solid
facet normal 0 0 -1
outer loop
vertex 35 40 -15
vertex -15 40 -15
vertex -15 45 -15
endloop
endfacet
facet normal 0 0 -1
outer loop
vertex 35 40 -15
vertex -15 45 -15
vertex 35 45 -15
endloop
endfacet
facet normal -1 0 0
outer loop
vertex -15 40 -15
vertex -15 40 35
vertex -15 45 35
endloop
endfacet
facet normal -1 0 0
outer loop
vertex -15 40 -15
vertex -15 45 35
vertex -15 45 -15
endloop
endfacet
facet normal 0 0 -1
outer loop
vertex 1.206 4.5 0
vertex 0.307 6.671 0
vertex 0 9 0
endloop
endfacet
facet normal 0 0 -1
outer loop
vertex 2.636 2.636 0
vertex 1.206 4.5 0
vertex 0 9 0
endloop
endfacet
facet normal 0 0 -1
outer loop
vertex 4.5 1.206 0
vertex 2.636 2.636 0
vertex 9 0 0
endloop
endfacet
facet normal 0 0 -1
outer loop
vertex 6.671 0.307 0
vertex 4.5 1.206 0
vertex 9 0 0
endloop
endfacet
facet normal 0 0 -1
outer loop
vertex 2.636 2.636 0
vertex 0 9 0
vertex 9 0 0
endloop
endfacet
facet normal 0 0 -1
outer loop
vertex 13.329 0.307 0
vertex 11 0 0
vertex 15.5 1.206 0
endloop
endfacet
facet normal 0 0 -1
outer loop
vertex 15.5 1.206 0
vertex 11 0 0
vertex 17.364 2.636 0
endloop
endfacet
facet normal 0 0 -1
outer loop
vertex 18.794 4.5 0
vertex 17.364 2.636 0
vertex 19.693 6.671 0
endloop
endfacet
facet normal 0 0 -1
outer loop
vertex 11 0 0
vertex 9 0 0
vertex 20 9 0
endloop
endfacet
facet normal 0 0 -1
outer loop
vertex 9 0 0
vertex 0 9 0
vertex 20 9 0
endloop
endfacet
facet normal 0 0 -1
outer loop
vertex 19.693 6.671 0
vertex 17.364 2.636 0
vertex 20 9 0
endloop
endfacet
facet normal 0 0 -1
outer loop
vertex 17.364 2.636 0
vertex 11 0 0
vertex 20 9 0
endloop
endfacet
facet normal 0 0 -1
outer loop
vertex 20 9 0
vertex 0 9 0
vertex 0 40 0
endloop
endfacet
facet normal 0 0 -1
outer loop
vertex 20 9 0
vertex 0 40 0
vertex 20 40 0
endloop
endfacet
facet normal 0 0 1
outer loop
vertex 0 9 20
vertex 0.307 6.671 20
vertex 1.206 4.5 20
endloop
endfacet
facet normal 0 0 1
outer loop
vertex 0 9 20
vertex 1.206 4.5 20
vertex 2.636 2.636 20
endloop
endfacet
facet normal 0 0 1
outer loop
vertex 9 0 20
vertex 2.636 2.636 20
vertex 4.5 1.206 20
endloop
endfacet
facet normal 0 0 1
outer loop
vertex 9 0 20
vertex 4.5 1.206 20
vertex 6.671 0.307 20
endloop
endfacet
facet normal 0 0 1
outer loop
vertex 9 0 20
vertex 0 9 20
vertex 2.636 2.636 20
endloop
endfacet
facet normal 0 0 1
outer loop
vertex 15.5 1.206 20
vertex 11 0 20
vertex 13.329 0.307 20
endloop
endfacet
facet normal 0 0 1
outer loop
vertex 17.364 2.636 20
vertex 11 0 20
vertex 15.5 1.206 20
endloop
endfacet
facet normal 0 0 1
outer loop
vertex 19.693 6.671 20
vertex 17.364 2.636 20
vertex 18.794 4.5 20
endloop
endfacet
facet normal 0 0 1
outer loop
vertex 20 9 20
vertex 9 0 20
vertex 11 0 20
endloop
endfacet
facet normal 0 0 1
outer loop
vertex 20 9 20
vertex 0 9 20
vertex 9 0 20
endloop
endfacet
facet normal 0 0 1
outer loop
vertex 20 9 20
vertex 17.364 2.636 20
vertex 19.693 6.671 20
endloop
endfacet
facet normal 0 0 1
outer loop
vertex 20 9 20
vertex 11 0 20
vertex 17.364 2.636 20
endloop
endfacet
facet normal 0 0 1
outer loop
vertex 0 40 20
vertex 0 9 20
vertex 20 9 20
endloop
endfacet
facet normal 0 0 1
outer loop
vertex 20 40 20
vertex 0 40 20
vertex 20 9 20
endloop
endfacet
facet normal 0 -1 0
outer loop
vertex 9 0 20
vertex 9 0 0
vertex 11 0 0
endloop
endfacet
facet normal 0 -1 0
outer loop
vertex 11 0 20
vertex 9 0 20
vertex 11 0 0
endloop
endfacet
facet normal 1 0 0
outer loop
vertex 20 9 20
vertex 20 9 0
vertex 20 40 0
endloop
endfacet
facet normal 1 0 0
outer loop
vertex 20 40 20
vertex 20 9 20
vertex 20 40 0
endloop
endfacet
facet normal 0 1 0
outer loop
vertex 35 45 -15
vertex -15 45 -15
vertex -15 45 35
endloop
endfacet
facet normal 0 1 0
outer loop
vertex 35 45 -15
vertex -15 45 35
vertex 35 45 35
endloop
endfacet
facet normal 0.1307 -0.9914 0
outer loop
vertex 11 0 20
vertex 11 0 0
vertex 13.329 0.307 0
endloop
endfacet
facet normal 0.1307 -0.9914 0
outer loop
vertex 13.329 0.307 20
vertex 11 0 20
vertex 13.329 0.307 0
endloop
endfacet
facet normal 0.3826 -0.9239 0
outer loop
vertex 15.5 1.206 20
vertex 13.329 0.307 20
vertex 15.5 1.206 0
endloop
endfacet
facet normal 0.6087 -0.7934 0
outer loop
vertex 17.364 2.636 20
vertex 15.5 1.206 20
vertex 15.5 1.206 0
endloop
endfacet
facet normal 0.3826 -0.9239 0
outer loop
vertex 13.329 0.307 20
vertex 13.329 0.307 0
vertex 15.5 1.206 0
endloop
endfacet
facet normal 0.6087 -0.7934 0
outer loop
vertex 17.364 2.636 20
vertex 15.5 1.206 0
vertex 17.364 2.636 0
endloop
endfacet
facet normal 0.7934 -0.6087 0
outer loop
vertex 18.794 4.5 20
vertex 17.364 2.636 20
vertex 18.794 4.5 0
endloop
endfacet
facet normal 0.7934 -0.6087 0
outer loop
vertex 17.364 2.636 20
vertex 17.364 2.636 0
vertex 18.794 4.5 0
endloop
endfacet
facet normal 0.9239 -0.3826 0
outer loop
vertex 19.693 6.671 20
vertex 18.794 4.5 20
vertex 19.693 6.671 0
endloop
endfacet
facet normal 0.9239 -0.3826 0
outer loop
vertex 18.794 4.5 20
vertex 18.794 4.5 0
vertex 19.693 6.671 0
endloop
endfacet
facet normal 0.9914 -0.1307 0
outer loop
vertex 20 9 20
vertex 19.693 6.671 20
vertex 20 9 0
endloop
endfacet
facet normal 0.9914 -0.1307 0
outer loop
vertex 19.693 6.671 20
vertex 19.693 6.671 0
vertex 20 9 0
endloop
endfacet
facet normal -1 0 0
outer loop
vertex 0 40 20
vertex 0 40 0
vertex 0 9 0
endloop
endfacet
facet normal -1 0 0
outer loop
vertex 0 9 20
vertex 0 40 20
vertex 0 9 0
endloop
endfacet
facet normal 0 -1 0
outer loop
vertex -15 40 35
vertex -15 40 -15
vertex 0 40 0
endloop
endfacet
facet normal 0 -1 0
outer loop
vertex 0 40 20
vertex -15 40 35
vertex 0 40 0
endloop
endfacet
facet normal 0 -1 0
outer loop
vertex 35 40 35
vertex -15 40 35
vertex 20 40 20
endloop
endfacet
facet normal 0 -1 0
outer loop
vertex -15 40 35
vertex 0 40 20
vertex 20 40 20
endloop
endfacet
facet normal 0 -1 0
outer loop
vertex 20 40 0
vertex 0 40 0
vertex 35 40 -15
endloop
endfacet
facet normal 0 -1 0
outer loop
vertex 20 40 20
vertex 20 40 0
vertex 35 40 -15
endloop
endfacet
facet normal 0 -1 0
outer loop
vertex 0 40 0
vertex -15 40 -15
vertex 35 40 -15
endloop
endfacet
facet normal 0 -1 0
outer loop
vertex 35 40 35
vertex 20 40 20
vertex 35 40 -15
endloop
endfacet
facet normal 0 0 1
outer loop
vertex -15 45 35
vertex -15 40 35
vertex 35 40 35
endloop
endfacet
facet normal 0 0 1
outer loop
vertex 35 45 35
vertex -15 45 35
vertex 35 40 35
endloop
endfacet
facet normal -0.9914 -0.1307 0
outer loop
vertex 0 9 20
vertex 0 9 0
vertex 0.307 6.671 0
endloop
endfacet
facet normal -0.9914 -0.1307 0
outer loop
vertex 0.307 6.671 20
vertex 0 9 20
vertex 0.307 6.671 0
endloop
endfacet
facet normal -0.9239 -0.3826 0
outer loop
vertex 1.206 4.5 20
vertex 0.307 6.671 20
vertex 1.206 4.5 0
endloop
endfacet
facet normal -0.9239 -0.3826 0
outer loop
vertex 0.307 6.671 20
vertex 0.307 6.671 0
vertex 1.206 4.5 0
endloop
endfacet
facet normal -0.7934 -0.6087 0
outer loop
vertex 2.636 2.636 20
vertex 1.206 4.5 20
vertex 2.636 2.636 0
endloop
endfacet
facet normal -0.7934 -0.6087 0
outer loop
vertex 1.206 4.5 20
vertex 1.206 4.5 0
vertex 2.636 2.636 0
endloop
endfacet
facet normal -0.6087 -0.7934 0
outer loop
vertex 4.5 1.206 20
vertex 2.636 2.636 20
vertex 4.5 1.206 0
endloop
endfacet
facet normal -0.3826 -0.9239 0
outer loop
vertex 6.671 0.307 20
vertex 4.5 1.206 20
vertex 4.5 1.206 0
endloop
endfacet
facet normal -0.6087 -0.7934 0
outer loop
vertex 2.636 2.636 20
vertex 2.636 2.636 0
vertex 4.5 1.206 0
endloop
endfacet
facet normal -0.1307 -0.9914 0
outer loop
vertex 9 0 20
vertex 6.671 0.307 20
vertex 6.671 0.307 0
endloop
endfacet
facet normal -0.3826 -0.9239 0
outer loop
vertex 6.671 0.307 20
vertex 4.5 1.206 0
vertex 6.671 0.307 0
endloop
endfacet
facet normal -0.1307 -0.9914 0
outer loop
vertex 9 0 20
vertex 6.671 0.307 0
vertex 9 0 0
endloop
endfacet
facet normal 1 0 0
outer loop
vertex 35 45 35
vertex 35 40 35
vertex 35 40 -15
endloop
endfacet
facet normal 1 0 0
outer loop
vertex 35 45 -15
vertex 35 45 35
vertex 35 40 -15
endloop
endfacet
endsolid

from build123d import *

# Parameters (mm, degrees)
RESSALTO_EXTRUS_O1_DEPTH = 20
ESBO_O2_W                = 50
ESBO_O2_H                = 50
RESSALTO_EXTRUS_O2_DEPTH = 5


with BuildPart() as part:
    # Esboço1 → Ressalto-extrusão1 (new body)
    with BuildSketch(Plane.XY):
        with BuildLine():
            Line((9, 0), (11, 0))
            ThreePointArc((11, 0), (17.363961031, 2.636038969), (20, 9))
            Line((20, 9), (20, 40))
            Line((20, 40), (0, 40))
            Line((0, 40), (0, 9))
            ThreePointArc((0, 9), (2.636038969, 2.636038969), (9, 0))
        make_face()
    extrude(amount=RESSALTO_EXTRUS_O1_DEPTH)

    # Esboço2 → Ressalto-extrusão2 (add)
    with BuildSketch(Plane(origin=(0, 40, 0), x_dir=(1, 0, 0), z_dir=(0, 1, 0))):
        with Locations((10, -10)):
            Rectangle(ESBO_O2_W, ESBO_O2_H)
    extrude(amount=RESSALTO_EXTRUS_O2_DEPTH)


solid = part.part
